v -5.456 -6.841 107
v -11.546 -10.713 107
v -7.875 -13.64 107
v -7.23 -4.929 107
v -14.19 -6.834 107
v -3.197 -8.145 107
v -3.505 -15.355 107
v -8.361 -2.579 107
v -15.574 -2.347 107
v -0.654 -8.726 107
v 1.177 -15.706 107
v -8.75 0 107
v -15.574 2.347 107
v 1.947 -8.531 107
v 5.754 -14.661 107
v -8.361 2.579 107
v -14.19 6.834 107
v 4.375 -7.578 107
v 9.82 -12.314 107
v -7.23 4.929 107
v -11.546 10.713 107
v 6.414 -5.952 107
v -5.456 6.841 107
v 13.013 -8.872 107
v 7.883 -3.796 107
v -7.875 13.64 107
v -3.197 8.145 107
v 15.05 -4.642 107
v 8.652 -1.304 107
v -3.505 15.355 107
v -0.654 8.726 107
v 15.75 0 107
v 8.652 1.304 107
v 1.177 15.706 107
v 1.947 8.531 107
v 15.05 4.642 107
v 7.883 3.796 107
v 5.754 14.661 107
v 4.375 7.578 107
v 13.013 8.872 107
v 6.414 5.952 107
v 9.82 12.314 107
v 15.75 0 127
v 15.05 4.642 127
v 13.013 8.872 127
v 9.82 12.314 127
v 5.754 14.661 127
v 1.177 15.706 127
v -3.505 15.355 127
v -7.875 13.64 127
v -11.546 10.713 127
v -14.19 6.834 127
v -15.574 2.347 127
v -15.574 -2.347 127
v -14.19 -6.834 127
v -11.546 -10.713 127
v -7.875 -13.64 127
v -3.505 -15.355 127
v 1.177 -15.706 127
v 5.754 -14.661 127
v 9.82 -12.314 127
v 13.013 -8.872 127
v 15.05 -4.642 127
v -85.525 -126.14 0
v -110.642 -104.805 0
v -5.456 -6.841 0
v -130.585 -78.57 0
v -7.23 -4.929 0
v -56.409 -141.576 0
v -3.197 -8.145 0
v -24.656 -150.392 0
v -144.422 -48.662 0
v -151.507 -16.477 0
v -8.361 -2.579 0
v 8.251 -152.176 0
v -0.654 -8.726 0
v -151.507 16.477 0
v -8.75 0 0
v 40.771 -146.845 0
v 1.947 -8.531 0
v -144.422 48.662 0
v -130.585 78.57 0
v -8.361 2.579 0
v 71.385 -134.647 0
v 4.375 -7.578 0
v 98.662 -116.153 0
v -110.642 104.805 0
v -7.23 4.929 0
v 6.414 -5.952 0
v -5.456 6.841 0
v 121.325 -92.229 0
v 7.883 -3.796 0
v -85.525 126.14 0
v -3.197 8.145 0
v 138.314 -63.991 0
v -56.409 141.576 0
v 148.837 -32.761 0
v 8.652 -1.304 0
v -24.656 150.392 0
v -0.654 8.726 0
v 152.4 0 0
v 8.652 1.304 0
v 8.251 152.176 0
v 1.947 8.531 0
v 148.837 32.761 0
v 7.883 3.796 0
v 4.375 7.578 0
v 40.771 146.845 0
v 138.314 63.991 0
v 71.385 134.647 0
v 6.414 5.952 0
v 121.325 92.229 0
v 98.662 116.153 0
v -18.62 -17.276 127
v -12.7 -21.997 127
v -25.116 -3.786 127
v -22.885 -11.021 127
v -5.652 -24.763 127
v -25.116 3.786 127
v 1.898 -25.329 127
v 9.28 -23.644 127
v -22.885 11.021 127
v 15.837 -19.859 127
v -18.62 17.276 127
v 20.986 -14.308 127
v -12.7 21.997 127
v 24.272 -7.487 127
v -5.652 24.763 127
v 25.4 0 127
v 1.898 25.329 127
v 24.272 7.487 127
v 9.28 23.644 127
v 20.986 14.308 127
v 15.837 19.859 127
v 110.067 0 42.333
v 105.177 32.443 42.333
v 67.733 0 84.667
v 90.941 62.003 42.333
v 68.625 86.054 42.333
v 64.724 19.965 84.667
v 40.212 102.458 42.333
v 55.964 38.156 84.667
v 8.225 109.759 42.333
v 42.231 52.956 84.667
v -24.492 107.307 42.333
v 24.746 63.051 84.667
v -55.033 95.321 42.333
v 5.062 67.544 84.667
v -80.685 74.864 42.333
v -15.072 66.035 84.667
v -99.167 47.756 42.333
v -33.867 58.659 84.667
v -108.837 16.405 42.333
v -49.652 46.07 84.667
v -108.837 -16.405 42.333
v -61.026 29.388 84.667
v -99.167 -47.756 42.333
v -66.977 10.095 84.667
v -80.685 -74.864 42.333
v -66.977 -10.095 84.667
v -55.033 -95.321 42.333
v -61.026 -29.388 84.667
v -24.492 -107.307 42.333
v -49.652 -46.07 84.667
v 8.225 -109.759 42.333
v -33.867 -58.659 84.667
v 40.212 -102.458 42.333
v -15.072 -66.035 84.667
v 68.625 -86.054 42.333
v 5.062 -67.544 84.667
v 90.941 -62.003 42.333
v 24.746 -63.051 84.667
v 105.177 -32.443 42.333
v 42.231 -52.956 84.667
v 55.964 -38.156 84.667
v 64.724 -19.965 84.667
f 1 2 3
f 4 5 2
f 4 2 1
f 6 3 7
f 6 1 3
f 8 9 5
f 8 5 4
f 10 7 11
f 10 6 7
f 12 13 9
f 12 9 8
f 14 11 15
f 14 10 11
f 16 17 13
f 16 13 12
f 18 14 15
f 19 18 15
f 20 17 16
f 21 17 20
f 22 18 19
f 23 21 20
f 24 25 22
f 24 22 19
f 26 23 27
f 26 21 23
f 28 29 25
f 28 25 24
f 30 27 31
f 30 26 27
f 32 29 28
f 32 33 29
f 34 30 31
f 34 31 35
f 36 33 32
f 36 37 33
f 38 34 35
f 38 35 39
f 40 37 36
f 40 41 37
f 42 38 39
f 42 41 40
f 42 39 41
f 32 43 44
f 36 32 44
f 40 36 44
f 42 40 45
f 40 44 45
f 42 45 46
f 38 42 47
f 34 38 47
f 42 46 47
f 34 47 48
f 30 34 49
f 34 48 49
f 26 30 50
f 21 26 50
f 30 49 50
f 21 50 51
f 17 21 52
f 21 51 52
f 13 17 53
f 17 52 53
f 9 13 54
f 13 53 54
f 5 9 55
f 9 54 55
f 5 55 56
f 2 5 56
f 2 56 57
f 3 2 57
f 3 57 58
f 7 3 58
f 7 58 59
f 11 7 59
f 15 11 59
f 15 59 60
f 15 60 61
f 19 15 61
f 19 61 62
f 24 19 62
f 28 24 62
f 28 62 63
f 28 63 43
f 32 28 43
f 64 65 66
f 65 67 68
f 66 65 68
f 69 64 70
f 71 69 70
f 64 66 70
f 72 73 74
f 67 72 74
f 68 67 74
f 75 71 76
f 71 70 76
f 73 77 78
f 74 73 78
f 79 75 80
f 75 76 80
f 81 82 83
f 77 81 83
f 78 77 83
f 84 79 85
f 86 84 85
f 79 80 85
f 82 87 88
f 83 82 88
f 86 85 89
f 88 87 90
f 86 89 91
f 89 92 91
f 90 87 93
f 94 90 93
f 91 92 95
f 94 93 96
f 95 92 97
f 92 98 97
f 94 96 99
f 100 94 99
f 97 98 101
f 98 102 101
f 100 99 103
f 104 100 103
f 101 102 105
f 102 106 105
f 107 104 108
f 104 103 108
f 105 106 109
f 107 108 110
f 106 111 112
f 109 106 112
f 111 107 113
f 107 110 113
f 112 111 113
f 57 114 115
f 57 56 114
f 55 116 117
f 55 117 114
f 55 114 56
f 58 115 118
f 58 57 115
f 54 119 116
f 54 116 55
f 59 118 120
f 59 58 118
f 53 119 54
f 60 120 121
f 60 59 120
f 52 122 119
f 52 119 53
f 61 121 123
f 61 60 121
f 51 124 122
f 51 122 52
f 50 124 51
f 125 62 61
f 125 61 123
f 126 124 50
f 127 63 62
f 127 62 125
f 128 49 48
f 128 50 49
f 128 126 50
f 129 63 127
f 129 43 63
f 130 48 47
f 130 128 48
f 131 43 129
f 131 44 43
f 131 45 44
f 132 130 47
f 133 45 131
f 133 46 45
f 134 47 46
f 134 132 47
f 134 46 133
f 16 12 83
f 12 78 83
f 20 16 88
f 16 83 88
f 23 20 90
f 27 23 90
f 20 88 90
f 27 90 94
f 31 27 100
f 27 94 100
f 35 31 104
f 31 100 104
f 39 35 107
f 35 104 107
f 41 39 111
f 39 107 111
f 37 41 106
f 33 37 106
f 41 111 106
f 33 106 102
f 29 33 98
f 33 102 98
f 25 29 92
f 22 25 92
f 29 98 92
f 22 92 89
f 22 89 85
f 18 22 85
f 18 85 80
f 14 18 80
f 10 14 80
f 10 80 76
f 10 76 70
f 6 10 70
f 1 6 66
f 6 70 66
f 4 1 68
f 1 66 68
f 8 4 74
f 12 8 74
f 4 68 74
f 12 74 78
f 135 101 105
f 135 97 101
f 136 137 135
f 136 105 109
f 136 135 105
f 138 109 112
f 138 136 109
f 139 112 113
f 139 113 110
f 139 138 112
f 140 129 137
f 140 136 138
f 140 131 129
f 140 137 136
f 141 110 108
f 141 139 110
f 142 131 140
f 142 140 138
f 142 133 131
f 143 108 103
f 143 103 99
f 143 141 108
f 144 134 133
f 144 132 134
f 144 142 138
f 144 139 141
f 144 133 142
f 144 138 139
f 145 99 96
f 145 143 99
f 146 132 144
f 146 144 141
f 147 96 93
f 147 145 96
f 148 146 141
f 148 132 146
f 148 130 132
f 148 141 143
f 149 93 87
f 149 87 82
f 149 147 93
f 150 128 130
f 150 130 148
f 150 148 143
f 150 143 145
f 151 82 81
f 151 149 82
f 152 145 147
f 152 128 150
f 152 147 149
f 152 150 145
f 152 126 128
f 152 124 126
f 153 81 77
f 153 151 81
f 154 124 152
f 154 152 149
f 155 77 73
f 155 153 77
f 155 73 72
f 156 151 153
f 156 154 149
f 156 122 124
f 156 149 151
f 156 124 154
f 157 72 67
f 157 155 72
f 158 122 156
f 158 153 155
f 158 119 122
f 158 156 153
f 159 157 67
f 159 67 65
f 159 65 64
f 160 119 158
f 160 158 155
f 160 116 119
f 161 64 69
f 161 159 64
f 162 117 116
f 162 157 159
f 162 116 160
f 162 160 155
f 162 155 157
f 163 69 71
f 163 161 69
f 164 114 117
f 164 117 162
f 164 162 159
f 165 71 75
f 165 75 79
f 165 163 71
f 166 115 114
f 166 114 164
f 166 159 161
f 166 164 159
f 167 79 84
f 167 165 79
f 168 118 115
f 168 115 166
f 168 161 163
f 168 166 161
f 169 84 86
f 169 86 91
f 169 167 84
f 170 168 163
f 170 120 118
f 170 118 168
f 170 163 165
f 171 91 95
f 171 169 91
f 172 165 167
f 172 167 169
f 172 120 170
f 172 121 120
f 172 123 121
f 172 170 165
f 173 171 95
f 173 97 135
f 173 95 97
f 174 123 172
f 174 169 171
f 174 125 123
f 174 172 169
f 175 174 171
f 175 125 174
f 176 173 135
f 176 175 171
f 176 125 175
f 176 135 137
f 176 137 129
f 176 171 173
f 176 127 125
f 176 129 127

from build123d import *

# Parameters (mm, degrees)
F0_R           = 152.4
F1_DEPTH       = 127
F3_D           = 17.5
F3_CBORE_D     = 31.5
F3_CBORE_DEPTH = 20
F4_SIZE        = 126.99999


# Not quite as in the source:
# - a fillet or chamfer is up to 0.001 mm smaller than in the source, because OpenCascade refuses the exact size


with BuildPart() as f1:
    # F0 (on Top) → F1 (new body)
    with BuildSketch(Plane.XY):
        Circle(F0_R)
    extrude(amount=F1_DEPTH)

    # F3 (through all)
    with Locations(Plane.XY.offset(127)):
        with Locations((0, 0)):
            CounterBoreHole(F3_D / 2, F3_CBORE_D / 2, F3_CBORE_DEPTH)

    # F4 (size 127 in the source; OpenCascade refuses exactly that, so slightly less here)
    f4_edges = [f1.edges().sort_by_distance(p)[0] for p in [
        (-152.4, 0, 127),
    ]]
    chamfer(f4_edges, length=F4_SIZE)


solid = f1.part
